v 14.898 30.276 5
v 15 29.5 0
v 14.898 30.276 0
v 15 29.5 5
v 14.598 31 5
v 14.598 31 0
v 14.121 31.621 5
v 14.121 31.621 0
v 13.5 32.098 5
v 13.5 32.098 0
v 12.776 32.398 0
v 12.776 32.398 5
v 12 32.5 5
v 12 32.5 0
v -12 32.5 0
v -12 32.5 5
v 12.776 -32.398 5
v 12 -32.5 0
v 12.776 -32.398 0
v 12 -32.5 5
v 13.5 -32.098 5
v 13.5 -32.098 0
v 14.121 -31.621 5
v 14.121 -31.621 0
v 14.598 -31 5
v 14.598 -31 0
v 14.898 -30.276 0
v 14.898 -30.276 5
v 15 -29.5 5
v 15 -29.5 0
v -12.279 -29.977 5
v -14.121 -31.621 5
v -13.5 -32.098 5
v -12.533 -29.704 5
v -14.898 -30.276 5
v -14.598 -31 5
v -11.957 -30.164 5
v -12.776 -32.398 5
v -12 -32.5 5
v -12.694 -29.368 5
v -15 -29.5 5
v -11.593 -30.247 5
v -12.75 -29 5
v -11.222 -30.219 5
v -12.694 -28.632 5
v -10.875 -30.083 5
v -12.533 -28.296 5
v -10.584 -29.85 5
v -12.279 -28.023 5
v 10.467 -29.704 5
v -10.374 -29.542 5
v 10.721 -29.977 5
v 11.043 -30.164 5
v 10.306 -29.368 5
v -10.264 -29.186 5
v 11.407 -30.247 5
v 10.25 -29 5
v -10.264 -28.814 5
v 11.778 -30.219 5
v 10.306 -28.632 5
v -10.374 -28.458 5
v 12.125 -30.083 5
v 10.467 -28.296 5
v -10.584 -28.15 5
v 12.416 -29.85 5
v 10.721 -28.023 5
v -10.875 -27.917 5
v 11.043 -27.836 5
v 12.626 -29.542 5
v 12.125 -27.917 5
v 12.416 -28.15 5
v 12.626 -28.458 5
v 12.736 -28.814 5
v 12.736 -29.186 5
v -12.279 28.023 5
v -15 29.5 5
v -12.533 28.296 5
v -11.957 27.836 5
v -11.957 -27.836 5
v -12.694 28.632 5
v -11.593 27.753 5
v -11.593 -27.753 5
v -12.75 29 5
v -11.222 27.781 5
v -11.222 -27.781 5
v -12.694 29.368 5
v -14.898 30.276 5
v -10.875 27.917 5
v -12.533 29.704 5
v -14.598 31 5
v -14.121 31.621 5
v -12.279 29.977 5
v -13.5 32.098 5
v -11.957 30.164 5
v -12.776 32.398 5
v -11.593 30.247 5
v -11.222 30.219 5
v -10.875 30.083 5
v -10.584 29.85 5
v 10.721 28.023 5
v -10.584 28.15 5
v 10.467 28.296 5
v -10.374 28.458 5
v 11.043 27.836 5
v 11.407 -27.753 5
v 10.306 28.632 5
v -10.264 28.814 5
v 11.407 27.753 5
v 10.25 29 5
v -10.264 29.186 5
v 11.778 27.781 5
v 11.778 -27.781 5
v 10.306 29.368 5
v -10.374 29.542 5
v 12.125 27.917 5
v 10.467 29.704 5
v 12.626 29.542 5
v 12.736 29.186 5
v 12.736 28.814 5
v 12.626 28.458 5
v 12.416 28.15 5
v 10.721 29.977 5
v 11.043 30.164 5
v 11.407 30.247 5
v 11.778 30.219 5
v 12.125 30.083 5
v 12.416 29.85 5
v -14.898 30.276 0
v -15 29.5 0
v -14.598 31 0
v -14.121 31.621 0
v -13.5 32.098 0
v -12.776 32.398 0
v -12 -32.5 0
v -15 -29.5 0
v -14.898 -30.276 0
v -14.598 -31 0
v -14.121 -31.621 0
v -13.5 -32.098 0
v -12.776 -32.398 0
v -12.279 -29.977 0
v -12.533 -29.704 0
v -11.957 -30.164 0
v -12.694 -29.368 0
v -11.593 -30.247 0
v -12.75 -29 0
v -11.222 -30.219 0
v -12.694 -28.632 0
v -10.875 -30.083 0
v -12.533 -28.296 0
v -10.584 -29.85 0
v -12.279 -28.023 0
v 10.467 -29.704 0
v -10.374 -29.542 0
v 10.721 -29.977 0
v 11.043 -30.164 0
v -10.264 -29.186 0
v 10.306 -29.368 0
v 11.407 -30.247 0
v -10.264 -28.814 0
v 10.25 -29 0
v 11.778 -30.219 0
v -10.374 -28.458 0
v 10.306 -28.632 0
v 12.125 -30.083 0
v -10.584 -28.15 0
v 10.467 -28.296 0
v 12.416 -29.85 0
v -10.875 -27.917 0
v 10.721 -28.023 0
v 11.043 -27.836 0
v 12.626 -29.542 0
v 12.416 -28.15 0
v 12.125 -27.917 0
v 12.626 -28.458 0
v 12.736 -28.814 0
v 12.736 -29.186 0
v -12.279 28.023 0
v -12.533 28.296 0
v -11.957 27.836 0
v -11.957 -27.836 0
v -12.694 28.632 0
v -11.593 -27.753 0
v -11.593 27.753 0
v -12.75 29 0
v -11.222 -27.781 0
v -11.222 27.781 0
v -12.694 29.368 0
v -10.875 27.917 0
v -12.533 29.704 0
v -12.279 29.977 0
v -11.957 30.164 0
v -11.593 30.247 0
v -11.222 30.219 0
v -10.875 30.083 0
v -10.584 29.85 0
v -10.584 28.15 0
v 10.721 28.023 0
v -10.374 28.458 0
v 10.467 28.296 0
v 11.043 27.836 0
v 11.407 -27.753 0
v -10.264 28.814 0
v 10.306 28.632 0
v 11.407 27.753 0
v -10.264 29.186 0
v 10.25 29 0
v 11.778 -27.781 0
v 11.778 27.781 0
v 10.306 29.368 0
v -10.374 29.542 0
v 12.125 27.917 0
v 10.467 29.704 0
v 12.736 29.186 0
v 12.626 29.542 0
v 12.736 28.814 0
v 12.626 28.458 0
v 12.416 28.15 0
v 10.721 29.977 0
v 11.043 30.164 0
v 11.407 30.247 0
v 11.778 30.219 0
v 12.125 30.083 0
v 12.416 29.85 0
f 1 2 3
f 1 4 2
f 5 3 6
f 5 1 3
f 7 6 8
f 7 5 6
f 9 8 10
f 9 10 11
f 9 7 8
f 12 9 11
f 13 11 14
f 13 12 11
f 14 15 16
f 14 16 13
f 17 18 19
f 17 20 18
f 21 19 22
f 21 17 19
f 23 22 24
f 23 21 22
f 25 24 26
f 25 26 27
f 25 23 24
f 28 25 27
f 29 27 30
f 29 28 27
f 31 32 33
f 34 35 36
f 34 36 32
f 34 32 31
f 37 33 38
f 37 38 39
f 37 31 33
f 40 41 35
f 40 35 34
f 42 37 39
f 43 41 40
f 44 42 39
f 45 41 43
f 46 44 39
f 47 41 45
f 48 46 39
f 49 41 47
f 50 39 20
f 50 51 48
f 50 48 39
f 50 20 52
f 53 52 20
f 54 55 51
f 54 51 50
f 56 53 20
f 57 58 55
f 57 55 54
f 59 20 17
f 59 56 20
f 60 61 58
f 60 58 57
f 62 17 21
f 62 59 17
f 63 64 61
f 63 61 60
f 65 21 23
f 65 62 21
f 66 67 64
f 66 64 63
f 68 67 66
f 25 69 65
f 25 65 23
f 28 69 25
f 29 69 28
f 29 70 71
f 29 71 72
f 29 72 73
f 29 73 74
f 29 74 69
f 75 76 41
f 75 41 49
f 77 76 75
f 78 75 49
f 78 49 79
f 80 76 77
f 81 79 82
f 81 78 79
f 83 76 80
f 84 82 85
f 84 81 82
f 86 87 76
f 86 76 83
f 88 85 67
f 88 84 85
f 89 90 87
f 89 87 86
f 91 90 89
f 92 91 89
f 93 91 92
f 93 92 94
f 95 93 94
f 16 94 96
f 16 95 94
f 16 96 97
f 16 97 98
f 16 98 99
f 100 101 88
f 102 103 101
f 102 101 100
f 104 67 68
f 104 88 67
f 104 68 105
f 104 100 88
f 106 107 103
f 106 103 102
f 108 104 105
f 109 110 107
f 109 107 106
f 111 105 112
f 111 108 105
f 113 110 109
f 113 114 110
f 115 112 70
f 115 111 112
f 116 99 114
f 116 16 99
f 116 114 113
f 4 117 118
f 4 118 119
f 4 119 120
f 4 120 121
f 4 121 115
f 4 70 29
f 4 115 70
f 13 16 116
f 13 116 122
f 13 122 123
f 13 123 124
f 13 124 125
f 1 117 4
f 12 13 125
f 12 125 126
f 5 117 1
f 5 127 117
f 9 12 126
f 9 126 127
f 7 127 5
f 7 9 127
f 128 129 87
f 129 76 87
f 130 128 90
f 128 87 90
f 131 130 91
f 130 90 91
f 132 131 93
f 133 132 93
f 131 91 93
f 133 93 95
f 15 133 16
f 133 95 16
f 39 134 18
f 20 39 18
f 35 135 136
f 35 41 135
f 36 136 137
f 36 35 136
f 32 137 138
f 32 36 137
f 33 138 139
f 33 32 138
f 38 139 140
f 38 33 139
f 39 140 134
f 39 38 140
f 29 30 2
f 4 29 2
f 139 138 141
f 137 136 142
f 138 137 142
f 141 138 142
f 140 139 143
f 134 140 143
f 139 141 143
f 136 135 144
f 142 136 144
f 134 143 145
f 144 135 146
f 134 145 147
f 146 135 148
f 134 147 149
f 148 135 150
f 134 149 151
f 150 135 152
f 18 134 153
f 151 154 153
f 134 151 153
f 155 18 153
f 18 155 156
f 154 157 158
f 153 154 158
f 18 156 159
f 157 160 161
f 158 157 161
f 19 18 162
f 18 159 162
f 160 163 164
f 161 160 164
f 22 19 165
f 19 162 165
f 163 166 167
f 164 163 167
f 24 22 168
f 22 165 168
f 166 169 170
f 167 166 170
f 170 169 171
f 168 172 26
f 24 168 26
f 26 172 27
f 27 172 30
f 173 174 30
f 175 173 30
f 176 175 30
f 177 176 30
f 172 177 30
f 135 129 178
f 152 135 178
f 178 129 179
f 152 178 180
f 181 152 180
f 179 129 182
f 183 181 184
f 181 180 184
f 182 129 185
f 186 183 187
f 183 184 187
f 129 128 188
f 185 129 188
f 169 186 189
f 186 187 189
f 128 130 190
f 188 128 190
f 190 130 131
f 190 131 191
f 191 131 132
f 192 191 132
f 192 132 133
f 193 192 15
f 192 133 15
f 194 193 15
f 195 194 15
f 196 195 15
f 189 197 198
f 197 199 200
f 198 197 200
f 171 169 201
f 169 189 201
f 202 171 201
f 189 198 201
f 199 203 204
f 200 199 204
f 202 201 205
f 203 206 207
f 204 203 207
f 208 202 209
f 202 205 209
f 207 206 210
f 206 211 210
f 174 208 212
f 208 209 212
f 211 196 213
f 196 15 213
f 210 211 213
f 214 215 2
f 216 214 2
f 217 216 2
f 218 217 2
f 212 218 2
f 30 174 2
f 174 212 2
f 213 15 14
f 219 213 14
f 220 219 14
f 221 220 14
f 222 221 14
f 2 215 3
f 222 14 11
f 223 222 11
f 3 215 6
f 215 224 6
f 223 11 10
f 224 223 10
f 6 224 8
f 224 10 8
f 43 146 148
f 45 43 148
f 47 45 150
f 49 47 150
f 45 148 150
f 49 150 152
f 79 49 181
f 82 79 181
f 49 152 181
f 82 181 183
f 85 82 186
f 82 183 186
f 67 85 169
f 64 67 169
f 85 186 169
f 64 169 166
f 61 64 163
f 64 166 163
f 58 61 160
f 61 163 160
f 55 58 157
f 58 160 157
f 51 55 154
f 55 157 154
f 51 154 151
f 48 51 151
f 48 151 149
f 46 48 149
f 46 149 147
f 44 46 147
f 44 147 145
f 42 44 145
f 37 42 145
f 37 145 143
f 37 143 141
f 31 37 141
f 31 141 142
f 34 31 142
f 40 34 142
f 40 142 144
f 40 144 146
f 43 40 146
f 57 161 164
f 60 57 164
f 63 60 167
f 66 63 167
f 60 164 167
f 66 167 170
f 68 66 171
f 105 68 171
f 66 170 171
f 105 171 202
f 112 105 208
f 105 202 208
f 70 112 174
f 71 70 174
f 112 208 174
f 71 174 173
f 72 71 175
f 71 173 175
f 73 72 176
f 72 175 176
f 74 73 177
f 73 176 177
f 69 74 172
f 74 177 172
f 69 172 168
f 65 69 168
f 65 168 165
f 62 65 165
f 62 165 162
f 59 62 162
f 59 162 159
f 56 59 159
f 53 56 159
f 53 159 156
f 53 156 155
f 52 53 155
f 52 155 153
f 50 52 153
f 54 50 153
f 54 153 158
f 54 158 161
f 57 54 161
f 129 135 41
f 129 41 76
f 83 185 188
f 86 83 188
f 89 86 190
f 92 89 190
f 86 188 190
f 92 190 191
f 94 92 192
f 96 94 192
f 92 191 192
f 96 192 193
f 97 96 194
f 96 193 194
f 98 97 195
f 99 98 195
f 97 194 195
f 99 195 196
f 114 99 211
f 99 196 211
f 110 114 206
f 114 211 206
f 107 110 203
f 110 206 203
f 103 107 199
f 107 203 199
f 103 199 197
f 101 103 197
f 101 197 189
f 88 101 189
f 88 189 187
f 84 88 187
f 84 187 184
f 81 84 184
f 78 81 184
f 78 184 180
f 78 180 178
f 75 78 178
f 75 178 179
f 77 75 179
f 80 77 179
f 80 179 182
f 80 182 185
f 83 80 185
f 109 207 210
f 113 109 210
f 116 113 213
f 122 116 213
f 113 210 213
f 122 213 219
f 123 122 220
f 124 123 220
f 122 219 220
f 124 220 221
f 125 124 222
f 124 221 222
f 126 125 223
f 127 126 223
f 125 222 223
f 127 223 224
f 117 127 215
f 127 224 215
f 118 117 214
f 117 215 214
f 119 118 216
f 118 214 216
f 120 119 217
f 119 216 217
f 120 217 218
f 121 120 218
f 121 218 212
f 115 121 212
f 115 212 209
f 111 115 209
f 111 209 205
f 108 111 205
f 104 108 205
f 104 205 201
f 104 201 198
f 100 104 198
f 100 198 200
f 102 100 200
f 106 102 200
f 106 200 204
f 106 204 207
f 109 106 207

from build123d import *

# Parameters (mm, degrees)
F0_W     = 30
F0_H     = 65
F1_DEPTH = 5
F2_R     = 3
F4_D     = 2.5


with BuildPart() as f1:
    # F0 (on Top) → F1 (new body)
    with BuildSketch(Plane.XY):
        Rectangle(F0_W, F0_H)
    extrude(amount=F1_DEPTH)

    # F2
    f2_edges = [f1.edges().sort_by_distance(p)[0] for p in [
        (15, -32.5, 2.5),
        (15, 32.5, 2.5),
        (-15, -32.5, 2.5),
        (-15, 32.5, 2.5),
    ]]
    fillet(f2_edges, radius=F2_R)

    # F4 (through all)
    with Locations(Plane.XY.offset(5)):
        with Locations((-11.5, -29), (11.5, -29), (11.5, 29), (-11.5, 29)):
            Hole(F4_D / 2)


solid = f1.part
